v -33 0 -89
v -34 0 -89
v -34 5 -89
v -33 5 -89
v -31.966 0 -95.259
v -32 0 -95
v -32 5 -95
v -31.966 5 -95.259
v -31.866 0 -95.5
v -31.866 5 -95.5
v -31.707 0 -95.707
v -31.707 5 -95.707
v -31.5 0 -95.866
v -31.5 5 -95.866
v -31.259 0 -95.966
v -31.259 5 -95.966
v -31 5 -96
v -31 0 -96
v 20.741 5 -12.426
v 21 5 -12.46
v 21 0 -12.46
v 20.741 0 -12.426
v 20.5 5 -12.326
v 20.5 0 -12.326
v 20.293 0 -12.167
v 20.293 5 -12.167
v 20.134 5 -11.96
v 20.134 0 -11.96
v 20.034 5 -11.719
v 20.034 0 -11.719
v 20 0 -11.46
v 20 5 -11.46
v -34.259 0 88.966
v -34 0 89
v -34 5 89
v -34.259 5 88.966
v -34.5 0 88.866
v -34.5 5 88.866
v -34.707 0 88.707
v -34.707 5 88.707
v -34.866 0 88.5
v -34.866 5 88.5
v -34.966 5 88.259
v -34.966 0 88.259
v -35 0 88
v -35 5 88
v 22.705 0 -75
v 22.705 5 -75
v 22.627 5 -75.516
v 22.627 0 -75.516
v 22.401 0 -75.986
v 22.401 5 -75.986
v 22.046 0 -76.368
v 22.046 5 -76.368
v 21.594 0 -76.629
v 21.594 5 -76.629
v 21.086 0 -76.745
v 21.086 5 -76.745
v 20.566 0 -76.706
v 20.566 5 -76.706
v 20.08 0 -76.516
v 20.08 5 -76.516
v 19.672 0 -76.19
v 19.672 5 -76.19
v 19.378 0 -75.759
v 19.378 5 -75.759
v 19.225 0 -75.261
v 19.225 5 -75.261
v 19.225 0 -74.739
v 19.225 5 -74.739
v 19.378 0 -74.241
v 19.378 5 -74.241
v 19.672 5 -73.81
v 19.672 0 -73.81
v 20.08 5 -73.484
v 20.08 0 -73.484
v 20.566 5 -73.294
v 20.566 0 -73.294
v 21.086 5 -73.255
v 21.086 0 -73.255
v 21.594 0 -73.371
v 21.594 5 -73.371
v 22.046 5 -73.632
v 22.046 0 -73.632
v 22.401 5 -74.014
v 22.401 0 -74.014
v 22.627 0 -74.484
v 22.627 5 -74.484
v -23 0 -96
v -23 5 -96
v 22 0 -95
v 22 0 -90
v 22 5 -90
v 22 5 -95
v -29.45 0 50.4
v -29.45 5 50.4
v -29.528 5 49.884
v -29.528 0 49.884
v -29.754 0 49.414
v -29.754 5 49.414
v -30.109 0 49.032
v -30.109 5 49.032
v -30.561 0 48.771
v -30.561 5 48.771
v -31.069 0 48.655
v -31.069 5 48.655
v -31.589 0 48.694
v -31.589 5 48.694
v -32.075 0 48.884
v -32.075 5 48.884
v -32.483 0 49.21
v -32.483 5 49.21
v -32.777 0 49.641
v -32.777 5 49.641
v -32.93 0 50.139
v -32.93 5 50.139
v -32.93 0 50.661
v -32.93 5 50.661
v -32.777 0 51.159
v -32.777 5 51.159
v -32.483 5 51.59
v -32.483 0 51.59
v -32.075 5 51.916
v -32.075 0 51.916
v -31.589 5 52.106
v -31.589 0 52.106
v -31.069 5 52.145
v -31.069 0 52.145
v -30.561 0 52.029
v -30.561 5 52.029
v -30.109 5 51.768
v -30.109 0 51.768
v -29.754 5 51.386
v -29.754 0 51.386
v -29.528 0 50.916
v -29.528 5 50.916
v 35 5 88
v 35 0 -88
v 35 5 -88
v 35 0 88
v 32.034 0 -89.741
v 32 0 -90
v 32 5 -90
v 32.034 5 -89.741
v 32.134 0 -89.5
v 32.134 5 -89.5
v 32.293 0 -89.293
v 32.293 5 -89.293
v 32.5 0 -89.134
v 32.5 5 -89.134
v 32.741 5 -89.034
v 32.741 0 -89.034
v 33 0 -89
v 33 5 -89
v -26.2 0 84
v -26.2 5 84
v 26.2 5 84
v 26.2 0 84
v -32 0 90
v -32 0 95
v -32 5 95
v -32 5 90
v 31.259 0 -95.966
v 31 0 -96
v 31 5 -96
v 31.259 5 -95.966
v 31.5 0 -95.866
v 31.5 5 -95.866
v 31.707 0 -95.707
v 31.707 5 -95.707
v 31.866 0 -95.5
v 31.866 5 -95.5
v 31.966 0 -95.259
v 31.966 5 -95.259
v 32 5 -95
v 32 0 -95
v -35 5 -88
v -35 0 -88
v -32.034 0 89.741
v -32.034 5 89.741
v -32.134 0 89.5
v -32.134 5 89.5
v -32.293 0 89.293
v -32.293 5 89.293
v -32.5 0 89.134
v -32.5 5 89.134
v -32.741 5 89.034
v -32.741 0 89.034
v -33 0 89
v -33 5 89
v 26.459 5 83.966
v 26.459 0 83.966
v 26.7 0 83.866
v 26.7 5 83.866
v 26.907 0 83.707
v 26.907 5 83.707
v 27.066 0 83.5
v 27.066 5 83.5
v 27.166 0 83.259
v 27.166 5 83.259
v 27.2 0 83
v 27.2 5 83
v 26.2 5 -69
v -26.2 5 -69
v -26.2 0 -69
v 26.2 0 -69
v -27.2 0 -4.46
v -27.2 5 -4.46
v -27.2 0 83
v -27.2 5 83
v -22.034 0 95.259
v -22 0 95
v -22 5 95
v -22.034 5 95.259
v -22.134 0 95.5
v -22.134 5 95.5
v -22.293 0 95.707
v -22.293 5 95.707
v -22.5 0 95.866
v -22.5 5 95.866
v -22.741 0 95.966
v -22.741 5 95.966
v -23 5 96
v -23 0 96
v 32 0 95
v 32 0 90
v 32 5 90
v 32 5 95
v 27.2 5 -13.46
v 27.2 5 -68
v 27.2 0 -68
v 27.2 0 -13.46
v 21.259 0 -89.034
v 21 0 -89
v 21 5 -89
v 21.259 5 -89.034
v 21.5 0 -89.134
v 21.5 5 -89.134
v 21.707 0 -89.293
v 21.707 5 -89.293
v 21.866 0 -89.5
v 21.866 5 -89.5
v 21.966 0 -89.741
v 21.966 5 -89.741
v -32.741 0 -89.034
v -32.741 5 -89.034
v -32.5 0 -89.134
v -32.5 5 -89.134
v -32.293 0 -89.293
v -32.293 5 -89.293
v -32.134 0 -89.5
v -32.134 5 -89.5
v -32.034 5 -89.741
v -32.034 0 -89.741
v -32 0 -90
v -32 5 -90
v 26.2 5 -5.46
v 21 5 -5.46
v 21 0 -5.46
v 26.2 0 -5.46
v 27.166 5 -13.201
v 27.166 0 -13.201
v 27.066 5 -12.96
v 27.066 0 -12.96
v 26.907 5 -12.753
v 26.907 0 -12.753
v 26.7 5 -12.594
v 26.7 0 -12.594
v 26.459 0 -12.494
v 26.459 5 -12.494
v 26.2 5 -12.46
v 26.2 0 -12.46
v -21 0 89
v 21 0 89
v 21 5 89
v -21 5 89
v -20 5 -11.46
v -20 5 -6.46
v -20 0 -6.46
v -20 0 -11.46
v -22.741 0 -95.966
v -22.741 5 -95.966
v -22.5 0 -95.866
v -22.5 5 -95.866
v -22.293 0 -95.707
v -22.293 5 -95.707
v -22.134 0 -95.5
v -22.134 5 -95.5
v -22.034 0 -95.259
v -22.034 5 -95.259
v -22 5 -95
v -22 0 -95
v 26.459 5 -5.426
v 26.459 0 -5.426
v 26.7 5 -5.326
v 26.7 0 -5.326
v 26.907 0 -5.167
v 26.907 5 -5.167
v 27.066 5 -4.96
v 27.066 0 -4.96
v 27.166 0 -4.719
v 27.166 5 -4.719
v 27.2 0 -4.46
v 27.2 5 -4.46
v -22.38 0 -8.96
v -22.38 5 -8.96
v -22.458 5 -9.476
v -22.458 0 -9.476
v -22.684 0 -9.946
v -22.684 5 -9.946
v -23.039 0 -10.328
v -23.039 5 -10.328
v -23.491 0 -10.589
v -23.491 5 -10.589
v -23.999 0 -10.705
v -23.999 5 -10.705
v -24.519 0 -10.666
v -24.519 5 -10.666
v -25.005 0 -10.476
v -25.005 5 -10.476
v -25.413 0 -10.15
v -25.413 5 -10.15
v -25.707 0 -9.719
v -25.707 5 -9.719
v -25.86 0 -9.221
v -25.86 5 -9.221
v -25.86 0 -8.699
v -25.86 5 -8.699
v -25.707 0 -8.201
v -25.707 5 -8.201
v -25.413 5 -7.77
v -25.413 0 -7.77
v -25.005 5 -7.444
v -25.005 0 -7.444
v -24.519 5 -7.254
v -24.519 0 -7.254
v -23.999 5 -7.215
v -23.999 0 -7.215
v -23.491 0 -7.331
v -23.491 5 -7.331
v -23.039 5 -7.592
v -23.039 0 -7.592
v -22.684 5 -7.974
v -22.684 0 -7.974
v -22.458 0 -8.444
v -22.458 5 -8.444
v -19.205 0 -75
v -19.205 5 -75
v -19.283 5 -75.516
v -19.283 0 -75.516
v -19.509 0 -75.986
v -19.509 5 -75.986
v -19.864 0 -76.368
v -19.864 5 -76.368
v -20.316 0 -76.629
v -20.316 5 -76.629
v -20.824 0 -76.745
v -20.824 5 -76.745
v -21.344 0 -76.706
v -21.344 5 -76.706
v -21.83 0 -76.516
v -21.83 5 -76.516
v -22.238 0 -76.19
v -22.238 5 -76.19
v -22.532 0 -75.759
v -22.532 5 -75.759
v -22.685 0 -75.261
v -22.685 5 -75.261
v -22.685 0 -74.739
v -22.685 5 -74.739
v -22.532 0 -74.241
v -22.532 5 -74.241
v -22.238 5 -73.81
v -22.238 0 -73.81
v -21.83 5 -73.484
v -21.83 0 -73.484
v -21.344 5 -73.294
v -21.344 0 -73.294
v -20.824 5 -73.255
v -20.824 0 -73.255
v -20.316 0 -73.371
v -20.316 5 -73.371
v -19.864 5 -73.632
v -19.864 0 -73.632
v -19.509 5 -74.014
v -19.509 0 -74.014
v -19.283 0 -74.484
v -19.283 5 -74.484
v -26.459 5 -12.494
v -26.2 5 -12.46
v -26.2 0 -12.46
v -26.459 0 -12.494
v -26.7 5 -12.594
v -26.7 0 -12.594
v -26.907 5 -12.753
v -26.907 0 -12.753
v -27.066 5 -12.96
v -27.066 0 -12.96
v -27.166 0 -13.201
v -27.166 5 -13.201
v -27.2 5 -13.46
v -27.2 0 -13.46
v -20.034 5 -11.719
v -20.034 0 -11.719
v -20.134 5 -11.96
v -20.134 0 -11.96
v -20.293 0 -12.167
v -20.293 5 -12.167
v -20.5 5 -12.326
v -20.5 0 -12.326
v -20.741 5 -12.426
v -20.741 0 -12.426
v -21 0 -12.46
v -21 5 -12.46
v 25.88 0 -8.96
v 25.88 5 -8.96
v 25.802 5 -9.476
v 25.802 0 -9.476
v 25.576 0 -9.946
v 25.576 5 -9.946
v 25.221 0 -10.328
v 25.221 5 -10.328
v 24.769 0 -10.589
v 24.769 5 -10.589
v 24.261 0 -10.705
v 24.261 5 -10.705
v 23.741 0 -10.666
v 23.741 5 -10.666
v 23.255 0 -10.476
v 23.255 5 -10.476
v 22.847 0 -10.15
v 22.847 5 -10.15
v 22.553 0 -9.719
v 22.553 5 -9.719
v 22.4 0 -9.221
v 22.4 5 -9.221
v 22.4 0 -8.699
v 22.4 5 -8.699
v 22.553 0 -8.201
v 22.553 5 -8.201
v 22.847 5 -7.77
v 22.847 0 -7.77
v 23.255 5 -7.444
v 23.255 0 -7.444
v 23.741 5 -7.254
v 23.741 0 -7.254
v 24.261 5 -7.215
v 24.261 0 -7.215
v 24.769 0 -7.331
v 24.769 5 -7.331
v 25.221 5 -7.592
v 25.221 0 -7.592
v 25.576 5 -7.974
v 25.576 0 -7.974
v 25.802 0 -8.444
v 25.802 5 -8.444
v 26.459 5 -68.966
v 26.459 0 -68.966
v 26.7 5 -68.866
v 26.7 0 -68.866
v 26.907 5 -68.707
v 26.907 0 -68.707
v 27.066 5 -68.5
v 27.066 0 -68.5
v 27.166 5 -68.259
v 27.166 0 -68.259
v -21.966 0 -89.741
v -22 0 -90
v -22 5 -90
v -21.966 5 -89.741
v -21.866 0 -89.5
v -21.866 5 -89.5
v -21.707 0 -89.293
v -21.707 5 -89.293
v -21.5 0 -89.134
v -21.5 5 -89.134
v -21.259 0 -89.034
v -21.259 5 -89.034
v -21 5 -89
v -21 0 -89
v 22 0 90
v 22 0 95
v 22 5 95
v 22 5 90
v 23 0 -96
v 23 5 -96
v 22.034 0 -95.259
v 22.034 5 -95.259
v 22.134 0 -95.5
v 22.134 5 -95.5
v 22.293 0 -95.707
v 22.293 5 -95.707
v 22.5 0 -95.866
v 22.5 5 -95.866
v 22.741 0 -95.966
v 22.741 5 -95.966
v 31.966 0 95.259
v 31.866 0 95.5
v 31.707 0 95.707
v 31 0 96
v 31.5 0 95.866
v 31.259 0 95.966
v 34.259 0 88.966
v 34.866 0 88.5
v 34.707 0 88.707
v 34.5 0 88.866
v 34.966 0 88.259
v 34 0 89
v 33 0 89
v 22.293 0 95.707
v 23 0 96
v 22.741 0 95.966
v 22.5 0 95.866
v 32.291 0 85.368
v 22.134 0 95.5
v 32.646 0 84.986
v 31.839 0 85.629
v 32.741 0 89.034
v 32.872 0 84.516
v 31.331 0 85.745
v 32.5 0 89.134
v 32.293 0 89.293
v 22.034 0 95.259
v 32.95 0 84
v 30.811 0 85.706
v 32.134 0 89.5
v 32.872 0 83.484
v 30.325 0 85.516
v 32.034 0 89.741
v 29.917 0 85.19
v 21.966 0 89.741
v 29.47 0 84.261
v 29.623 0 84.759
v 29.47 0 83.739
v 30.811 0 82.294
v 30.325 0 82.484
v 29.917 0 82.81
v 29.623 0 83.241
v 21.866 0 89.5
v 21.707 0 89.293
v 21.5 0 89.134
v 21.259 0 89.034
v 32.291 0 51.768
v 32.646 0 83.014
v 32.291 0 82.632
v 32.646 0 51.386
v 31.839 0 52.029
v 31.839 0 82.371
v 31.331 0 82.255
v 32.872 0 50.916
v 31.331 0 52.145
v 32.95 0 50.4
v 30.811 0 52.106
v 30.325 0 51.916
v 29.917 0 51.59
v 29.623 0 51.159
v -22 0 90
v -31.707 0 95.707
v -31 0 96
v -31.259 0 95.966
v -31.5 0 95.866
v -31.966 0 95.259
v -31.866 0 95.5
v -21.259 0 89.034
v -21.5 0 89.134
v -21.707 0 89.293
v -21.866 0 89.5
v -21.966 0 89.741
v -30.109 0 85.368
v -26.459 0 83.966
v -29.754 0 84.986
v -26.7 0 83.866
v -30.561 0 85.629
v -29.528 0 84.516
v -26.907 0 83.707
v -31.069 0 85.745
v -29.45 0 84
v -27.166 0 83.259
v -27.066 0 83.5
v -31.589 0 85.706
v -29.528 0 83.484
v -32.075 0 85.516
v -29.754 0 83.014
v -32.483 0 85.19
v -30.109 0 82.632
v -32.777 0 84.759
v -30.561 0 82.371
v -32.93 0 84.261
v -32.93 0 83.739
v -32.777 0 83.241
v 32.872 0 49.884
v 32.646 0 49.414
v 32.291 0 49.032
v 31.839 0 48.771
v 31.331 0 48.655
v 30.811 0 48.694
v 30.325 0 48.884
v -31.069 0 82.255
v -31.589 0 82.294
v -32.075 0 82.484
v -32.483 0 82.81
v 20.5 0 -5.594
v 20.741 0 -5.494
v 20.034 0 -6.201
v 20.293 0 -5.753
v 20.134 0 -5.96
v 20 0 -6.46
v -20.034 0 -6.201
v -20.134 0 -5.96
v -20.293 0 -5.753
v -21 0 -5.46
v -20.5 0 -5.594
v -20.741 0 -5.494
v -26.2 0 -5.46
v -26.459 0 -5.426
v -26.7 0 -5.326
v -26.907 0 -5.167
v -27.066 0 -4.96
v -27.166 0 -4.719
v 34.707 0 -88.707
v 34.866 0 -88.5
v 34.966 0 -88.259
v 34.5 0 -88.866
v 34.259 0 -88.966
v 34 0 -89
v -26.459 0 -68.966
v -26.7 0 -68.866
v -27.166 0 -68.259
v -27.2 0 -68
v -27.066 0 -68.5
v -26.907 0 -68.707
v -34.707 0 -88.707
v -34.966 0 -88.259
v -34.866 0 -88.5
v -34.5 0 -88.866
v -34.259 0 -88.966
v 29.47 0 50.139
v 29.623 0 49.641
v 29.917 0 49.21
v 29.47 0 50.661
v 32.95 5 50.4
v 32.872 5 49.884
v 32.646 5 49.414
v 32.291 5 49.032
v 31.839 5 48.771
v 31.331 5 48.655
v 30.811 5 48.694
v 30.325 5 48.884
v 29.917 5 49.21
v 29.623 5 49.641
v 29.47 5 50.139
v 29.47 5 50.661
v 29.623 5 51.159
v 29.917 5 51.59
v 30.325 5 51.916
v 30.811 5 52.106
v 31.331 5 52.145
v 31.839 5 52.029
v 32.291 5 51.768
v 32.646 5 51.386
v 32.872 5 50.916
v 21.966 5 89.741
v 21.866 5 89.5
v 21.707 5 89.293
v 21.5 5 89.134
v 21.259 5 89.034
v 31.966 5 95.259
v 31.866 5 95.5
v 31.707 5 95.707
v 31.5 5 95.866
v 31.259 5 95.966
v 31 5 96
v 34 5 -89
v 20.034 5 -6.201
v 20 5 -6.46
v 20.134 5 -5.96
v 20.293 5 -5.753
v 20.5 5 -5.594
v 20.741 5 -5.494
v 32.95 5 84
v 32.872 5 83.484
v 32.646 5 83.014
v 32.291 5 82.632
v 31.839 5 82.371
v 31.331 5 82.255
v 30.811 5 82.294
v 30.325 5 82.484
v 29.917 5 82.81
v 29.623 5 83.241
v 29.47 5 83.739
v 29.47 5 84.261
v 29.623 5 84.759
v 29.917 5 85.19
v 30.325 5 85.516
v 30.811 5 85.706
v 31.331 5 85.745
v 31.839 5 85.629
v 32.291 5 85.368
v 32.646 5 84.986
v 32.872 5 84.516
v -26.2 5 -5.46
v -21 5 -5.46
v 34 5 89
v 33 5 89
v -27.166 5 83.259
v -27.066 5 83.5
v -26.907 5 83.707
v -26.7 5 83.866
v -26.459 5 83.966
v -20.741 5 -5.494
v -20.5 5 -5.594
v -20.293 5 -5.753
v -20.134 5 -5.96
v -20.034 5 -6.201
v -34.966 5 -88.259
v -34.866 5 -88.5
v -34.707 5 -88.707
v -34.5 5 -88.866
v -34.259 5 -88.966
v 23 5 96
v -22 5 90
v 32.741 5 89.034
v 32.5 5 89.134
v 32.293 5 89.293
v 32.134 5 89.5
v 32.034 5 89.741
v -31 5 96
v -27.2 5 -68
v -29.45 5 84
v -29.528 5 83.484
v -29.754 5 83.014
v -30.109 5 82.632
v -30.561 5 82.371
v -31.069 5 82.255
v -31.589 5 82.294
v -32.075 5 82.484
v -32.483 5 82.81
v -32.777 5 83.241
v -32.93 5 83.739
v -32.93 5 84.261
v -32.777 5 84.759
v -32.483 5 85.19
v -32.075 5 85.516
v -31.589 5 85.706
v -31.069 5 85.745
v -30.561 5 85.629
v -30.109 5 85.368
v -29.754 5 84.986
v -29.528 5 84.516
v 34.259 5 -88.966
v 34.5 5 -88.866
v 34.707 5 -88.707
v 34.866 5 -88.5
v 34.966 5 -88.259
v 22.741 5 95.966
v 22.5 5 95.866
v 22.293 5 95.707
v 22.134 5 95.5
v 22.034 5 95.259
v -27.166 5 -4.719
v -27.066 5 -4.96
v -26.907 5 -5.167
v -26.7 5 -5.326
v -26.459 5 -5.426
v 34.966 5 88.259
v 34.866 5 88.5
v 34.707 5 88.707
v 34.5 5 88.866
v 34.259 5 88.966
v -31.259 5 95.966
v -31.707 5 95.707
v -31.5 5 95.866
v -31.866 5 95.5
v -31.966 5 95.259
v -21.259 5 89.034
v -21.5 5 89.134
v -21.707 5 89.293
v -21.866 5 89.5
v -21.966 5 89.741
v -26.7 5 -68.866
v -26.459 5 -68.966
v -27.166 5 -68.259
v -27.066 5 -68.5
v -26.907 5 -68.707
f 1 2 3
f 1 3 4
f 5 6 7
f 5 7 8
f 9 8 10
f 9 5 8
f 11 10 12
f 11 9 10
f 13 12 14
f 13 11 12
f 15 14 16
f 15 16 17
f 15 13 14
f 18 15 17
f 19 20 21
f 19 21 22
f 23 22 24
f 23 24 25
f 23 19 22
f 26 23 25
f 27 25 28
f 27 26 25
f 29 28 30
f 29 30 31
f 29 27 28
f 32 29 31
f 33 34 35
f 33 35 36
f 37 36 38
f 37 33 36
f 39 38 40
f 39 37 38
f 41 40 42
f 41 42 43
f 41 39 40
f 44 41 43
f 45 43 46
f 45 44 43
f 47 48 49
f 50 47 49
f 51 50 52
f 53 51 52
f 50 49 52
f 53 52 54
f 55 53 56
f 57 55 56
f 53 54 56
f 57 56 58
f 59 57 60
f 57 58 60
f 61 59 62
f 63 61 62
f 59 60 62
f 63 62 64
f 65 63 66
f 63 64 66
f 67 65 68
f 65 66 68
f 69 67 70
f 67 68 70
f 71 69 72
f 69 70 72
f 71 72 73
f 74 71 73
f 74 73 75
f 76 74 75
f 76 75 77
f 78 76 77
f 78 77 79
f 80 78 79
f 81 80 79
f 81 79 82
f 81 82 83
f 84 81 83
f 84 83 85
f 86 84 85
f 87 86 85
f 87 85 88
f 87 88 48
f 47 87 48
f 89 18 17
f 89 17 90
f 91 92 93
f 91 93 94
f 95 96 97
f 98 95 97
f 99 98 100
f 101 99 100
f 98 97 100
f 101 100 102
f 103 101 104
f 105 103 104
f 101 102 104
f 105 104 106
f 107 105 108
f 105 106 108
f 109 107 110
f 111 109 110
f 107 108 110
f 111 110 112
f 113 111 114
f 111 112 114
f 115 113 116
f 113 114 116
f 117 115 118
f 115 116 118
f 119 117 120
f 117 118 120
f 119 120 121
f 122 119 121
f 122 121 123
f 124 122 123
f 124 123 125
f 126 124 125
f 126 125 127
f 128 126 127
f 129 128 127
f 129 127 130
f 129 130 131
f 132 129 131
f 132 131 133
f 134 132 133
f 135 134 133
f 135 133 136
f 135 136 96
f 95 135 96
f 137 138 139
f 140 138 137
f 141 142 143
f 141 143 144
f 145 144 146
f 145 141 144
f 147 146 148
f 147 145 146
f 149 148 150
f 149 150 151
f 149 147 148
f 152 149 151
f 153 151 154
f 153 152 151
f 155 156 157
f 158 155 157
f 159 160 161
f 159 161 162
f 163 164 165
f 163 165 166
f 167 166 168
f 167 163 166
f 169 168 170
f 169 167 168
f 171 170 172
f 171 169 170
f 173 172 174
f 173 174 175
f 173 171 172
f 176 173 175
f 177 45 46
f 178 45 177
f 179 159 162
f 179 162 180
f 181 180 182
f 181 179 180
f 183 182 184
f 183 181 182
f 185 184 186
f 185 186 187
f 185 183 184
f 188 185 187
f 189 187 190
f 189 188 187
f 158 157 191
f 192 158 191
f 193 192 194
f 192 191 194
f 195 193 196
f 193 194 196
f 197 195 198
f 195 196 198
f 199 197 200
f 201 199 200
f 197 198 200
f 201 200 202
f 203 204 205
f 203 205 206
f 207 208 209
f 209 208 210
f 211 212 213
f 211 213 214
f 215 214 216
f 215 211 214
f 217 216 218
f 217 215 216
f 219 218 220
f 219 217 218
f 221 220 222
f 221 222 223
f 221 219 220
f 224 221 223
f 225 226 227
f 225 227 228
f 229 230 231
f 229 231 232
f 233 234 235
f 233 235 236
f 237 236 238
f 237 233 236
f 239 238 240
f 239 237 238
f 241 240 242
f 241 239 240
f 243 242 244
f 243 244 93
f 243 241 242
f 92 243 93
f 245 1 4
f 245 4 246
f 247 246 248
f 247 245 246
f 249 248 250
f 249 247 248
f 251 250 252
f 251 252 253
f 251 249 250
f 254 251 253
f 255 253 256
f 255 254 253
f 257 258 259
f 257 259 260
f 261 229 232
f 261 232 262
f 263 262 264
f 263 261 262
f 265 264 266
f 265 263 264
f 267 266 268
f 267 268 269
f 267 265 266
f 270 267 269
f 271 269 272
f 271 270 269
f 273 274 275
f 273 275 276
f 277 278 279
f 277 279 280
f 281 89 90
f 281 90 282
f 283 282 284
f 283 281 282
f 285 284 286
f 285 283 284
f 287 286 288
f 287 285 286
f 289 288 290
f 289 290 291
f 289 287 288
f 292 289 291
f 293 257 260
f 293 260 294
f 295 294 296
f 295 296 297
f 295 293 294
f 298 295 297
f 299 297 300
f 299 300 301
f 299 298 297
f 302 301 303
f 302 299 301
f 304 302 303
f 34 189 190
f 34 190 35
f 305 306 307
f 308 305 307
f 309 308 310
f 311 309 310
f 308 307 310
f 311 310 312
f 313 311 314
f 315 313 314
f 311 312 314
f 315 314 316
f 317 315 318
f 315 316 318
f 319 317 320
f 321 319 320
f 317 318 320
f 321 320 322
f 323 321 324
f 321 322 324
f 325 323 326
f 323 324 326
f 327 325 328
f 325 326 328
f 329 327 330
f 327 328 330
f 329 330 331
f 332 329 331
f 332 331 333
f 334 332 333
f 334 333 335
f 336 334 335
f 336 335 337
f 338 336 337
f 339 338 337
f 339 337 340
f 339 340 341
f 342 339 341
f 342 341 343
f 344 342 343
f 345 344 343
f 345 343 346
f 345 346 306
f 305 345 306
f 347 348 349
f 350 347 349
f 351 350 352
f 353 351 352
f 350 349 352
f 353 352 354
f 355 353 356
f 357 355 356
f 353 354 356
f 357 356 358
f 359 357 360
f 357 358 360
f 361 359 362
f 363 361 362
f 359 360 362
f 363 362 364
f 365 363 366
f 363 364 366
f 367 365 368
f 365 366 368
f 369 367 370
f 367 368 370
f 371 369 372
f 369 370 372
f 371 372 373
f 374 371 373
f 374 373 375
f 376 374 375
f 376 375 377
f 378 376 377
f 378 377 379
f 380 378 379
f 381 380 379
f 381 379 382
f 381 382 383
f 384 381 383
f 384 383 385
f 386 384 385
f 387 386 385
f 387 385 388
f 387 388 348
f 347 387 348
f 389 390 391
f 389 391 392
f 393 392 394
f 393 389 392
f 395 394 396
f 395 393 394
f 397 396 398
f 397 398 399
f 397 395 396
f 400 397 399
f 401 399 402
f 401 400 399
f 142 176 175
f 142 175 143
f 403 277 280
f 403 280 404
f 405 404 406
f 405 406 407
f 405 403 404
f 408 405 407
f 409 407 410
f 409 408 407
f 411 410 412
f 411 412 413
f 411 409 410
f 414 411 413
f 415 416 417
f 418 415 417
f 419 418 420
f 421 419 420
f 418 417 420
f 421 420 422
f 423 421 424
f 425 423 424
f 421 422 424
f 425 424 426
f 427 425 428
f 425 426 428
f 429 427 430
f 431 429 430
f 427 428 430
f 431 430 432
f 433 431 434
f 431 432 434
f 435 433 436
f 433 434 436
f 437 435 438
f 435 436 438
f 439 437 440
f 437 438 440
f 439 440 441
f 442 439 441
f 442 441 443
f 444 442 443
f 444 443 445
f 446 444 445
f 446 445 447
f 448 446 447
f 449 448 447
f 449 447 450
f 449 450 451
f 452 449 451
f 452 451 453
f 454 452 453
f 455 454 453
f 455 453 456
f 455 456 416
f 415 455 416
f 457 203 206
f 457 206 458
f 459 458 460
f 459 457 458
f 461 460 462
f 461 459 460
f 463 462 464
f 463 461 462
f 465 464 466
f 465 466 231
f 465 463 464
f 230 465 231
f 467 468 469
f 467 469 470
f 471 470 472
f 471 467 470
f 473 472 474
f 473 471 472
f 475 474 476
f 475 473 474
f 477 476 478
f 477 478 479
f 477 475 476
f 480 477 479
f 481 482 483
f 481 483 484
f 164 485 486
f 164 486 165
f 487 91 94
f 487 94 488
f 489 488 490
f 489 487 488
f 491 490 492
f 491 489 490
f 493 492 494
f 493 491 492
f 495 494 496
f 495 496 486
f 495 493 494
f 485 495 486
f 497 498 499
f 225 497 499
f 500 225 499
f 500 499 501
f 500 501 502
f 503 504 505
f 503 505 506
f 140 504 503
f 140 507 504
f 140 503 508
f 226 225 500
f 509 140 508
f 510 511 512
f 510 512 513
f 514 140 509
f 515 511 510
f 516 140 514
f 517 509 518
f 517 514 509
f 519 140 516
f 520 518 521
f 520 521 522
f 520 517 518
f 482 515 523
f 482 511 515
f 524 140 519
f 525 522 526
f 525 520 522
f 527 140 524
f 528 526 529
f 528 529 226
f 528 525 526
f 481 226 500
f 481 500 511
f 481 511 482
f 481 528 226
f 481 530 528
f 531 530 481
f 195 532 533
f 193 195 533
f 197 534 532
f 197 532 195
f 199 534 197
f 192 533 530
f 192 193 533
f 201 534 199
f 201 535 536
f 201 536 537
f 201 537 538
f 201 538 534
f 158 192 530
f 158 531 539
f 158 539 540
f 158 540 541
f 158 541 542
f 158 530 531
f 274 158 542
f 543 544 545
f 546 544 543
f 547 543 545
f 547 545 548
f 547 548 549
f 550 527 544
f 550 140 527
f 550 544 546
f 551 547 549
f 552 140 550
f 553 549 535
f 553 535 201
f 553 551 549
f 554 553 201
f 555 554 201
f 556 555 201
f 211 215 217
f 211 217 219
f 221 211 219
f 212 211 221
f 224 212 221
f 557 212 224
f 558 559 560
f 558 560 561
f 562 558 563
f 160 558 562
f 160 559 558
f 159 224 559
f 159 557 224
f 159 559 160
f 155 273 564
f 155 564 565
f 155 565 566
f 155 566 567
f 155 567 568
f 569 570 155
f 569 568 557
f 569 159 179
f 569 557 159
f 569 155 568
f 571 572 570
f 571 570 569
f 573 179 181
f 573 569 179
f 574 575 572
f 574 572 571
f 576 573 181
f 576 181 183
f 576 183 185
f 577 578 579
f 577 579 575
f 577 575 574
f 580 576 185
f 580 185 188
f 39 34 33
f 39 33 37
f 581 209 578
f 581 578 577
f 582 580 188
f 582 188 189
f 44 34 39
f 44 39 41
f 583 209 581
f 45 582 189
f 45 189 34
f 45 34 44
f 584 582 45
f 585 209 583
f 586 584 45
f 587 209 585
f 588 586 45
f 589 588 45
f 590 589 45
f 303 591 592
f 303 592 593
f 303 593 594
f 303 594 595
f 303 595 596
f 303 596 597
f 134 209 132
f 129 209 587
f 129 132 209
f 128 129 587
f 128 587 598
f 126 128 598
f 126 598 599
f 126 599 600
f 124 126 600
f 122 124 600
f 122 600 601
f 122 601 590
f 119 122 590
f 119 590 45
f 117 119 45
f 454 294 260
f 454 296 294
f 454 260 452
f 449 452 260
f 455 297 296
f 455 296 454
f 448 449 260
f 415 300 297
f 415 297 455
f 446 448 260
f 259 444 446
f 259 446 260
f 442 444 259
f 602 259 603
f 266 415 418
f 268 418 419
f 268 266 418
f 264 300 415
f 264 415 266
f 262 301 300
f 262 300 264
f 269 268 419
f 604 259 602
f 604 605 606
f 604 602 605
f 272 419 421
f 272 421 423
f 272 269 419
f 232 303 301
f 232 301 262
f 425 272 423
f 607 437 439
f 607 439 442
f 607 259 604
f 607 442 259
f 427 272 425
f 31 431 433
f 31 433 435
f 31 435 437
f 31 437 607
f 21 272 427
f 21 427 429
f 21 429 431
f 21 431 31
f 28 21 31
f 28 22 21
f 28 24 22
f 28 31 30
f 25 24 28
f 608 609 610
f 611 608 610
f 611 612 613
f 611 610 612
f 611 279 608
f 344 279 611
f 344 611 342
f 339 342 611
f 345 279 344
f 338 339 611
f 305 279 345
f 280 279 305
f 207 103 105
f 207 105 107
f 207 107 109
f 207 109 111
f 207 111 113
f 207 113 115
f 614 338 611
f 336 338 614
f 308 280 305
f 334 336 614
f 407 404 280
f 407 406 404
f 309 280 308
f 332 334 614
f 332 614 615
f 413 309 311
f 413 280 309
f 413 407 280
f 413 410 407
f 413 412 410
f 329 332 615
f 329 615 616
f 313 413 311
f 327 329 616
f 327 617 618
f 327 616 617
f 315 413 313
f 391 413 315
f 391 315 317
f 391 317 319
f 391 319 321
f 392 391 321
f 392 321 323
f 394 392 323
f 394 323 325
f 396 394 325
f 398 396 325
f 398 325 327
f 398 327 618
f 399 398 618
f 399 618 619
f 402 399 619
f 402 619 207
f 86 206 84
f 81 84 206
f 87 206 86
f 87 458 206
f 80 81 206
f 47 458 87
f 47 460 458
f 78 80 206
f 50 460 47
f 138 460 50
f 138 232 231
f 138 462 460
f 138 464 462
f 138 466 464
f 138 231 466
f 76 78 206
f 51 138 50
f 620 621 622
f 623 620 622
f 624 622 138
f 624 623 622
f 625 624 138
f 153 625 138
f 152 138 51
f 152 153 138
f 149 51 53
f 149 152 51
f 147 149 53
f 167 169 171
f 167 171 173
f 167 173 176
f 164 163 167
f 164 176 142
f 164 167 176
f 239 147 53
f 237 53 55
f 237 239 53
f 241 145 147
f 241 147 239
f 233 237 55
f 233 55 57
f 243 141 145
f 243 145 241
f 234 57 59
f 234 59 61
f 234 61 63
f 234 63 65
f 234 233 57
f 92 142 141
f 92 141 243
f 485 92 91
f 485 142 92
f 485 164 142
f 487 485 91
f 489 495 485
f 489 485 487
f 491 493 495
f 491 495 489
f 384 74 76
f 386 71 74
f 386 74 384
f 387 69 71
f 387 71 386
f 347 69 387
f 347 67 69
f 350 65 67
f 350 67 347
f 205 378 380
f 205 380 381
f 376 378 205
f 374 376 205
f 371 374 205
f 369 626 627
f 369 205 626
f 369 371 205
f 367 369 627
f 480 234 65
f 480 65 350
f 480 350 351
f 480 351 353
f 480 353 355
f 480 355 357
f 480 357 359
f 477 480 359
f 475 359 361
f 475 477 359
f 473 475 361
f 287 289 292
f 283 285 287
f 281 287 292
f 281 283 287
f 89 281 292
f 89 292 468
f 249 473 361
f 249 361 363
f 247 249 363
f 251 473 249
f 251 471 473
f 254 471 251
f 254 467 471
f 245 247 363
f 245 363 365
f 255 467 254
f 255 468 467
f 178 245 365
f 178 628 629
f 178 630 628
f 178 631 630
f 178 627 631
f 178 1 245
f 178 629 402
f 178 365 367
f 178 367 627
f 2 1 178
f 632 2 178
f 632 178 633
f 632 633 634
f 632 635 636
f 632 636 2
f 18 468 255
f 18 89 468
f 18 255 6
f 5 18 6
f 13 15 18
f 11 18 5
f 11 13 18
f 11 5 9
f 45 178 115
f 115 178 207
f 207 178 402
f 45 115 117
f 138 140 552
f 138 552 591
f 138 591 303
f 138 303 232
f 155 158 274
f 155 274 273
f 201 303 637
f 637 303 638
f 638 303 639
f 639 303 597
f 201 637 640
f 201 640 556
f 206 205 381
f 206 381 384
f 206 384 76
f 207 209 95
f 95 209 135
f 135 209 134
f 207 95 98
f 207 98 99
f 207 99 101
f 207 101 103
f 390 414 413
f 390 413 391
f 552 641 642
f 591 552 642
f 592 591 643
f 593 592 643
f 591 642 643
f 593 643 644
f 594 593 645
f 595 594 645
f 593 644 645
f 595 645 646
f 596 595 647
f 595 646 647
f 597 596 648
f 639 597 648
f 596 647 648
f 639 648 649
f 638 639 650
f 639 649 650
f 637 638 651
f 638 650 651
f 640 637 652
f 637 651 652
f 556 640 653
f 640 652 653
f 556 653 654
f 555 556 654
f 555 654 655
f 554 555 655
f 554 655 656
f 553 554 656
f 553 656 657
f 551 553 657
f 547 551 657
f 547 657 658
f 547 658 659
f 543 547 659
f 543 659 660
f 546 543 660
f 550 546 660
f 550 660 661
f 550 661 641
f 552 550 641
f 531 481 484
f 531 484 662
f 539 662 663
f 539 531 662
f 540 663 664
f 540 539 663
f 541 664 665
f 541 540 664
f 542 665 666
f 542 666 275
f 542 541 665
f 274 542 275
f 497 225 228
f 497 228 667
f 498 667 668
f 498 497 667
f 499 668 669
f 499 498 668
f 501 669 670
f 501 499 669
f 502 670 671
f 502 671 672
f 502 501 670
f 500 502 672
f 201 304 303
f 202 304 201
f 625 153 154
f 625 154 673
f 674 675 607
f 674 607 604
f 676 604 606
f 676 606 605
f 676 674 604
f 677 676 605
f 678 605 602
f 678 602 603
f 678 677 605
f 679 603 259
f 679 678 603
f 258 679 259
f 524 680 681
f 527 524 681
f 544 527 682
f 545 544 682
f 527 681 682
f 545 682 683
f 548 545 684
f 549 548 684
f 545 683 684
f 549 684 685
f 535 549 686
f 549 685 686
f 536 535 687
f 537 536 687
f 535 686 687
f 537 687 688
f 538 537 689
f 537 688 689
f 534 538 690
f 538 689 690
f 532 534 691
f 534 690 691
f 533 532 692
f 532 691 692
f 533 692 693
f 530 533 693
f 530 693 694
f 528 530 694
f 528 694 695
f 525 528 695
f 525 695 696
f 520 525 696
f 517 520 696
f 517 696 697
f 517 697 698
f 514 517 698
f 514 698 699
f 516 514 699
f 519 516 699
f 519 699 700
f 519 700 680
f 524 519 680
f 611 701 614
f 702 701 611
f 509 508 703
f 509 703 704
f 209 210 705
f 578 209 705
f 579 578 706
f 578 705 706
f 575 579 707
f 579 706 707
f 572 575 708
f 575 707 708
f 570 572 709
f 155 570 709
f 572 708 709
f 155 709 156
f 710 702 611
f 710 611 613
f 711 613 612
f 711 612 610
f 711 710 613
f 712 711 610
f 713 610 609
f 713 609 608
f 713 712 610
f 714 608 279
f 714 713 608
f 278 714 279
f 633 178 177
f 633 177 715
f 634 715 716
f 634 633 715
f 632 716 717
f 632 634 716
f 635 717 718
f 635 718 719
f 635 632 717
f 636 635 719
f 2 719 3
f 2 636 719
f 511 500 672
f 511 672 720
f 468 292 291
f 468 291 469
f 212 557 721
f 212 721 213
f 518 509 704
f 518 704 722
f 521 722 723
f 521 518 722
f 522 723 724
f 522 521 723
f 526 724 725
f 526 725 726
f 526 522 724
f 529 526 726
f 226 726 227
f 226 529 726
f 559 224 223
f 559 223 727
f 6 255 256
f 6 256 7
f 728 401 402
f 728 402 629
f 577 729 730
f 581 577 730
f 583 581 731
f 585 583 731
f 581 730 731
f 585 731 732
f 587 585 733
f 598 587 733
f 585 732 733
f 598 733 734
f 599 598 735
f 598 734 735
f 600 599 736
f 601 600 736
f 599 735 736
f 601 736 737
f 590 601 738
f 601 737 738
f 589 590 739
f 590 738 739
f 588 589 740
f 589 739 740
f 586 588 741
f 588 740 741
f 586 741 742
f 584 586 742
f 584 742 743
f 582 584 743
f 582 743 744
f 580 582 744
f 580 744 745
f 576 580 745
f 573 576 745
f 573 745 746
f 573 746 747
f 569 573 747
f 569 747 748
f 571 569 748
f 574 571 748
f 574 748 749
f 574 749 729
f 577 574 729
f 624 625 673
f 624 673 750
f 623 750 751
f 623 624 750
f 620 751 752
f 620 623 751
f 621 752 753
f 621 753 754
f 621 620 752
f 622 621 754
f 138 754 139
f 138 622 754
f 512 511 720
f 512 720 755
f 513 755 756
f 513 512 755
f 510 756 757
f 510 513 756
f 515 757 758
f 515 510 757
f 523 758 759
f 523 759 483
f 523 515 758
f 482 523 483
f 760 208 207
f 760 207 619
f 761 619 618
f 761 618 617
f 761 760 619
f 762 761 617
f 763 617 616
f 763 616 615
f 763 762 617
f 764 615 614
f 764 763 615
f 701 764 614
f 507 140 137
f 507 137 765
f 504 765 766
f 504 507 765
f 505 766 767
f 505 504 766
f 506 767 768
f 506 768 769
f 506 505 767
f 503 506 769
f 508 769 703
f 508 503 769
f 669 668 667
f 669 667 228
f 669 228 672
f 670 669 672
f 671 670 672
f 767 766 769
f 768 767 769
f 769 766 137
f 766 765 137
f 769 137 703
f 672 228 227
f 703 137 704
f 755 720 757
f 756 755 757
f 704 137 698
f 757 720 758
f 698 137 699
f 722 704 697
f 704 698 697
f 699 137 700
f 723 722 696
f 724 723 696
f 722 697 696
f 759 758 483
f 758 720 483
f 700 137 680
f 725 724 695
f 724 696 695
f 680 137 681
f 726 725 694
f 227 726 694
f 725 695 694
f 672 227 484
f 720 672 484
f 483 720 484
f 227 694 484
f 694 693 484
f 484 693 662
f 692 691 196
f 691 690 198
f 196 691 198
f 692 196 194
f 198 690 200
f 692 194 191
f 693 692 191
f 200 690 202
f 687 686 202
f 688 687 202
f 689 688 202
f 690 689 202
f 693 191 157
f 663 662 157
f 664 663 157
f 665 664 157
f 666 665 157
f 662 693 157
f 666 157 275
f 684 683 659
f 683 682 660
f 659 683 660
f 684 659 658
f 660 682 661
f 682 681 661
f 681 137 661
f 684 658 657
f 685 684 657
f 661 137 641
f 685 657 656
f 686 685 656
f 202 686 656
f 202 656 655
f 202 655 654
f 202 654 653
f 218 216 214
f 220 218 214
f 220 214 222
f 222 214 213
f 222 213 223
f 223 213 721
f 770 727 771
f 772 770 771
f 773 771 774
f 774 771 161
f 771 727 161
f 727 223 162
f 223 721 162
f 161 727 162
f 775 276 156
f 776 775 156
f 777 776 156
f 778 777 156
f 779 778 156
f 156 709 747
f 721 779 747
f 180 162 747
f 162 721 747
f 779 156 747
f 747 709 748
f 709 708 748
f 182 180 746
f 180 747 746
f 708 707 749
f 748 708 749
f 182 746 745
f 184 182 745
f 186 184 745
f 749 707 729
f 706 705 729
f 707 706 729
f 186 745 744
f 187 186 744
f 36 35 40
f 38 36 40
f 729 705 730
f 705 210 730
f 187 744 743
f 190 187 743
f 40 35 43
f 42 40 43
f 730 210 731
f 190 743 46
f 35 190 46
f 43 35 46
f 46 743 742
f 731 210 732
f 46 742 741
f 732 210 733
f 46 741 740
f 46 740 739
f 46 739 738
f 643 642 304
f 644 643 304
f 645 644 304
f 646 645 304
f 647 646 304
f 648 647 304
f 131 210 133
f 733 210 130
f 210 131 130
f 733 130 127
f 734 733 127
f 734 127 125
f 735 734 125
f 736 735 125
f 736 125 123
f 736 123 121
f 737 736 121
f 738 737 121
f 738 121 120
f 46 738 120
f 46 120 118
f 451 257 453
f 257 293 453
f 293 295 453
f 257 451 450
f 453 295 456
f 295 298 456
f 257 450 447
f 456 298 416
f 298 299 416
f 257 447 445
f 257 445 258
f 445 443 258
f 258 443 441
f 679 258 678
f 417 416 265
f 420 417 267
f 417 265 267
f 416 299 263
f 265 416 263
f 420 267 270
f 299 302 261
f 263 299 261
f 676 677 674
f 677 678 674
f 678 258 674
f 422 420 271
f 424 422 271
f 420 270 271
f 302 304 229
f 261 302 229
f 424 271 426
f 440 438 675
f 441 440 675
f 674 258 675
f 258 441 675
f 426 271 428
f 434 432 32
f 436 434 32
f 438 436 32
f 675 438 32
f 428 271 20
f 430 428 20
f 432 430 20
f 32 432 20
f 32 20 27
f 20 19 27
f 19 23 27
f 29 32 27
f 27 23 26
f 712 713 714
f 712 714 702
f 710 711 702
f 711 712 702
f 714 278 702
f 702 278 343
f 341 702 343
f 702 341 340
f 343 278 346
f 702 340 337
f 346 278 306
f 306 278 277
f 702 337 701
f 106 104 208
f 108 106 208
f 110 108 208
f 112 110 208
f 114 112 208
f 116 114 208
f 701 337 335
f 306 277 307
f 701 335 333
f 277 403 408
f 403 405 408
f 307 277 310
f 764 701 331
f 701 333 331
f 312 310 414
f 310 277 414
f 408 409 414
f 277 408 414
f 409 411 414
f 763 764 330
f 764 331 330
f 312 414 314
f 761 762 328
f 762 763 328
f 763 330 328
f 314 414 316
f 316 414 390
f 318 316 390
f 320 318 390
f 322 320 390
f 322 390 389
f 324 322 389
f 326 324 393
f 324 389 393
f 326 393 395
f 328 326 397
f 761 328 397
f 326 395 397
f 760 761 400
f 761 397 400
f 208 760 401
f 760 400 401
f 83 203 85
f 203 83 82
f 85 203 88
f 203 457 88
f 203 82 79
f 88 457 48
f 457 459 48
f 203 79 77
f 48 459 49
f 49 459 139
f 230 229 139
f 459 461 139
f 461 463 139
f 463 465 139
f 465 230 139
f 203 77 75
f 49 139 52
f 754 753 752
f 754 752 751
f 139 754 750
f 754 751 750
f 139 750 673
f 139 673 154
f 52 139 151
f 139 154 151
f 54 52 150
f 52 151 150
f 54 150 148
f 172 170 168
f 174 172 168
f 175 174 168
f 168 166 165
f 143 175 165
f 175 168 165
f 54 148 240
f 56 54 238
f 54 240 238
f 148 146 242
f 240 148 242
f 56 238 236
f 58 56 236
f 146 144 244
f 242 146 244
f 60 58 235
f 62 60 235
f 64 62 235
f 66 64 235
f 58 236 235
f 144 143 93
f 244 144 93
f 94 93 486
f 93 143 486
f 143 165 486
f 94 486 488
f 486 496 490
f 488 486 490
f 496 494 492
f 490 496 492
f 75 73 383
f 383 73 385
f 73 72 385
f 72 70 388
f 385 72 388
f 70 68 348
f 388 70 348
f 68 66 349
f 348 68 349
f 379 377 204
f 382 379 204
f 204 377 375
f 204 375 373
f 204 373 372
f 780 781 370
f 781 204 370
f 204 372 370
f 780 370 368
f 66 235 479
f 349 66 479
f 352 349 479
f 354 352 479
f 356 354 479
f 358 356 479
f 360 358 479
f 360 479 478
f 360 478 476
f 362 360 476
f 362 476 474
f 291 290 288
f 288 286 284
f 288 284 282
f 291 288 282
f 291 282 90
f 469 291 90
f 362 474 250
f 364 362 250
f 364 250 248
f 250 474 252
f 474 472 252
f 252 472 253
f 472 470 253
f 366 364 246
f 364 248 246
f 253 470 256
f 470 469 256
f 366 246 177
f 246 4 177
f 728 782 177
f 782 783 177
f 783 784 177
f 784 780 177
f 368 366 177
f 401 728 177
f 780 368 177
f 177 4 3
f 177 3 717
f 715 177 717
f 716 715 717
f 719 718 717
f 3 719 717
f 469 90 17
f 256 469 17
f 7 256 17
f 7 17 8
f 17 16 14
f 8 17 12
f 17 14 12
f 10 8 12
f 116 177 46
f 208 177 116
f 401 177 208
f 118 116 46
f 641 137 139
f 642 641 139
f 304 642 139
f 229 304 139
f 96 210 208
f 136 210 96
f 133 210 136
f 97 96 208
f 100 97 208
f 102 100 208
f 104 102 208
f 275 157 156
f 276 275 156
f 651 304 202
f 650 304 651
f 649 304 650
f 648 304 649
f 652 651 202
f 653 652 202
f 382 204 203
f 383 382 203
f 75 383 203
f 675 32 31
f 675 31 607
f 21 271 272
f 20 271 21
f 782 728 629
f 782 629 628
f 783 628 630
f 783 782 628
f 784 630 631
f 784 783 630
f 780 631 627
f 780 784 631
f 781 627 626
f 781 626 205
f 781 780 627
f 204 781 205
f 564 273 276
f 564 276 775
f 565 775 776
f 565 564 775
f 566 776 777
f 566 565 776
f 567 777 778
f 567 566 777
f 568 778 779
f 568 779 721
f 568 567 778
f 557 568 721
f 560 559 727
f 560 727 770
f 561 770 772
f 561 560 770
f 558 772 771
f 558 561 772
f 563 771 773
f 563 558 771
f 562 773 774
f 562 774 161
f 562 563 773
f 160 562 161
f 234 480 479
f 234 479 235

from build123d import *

# Parameters (mm, degrees)
BOSS_EXTRUDE1_DEPTH = 5
SKETCH2_R           = 1.75
CUT_EXTRUDE1_DEPTH  = 10
SKETCH3_R           = 1.75
CUT_EXTRUDE2_DEPTH  = 10
CUT_EXTRUDE3_DEPTH  = 65
SKETCH5_W           = 54.4
SKETCH5_H           = 38
CUT_EXTRUDE4_DEPTH  = 5
CUT_EXTRUDE5_DEPTH  = 5


with BuildPart() as part:
    # Sketch1 → Boss-Extrude1 (new body)
    with BuildSketch(Plane(origin=(0, 0, 0), x_dir=(1, 0, 0), z_dir=(0, 1, 0))):
        with BuildLine():
            Line((34, -89), (33, -89))
            ThreePointArc((33, -89), (32.292893219, -89.292893219), (32, -90))
            Line((32, -90), (32, -95))
            ThreePointArc((32, -95), (31.707106781, -95.707106781), (31, -96))
            Line((31, -96), (23, -96))
            ThreePointArc((23, -96), (22.292893219, -95.707106781), (22, -95))
            Line((22, -95), (22, -90))
            ThreePointArc((22, -90), (21.707106781, -89.292893219), (21, -89))
            Line((21, -89), (-21, -89))
            ThreePointArc((-21, -89), (-21.707106781, -89.292893219), (-22, -90))
            Line((-22, -90), (-22, -95))
            ThreePointArc((-22, -95), (-22.292893219, -95.707106781), (-23, -96))
            Line((-23, -96), (-31, -96))
            ThreePointArc((-31, -96), (-31.707106781, -95.707106781), (-32, -95))
            Line((-32, -95), (-32, -90))
            ThreePointArc((-32, -90), (-32.292893219, -89.292893219), (-33, -89))
            Line((-33, -89), (-34, -89))
            ThreePointArc((-34, -89), (-34.707106781, -88.707106781), (-35, -88))
            Line((-35, -88), (-35, 88))
            ThreePointArc((-35, 88), (-34.707106781, 88.707106781), (-34, 89))
            Line((-34, 89), (-33, 89))
            ThreePointArc((-33, 89), (-32.292893219, 89.292893219), (-32, 90))
            Line((-32, 90), (-32, 95))
            ThreePointArc((-32, 95), (-31.707106781, 95.707106781), (-31, 96))
            Line((-31, 96), (-23, 96))
            ThreePointArc((-23, 96), (-22.292893219, 95.707106781), (-22, 95))
            Line((-22, 95), (-22, 90))
            ThreePointArc((-22, 90), (-21.707106781, 89.292893219), (-21, 89))
            Line((-21, 89), (21, 89))
            ThreePointArc((21, 89), (21.707106781, 89.292893219), (22, 90))
            Line((22, 90), (22, 95))
            ThreePointArc((22, 95), (22.292893219, 95.707106781), (23, 96))
            Line((23, 96), (31, 96))
            ThreePointArc((31, 96), (31.707106781, 95.707106781), (32, 95))
            Line((32, 95), (32, 90))
            ThreePointArc((32, 90), (32.292893219, 89.292893219), (33, 89))
            Line((33, 89), (34, 89))
            ThreePointArc((34, 89), (34.707106781, 88.707106781), (35, 88))
            Line((35, 88), (35, -88))
            ThreePointArc((35, -88), (34.707106781, -88.707106781), (34, -89))
        make_face()
    extrude(amount=BOSS_EXTRUDE1_DEPTH)

    # Sketch2 → Cut-Extrude1 (cut)
    with BuildSketch(Plane(origin=(0, 5, 0), x_dir=(1, 0, 0), z_dir=(0, 1, 0))):
        with Locations((-20.955, 75)):
            Circle(SKETCH2_R)
        with Locations((-24.13, 8.96)):
            Circle(SKETCH2_R)
        with Locations((20.955, 75)):
            Circle(SKETCH2_R)
        with Locations((24.13, 8.96)):
            Circle(SKETCH2_R)
    extrude(amount=-CUT_EXTRUDE1_DEPTH, mode=Mode.SUBTRACT)

    # Sketch3 → Cut-Extrude2 (cut)
    with BuildSketch(Plane(origin=(0, 5, 0), x_dir=(1, 0, 0), z_dir=(0, 1, 0))):
        with Locations((-31.2, -84)):
            Circle(SKETCH3_R)
        with Locations((31.2, -84)):
            Circle(SKETCH3_R)
        with Locations((31.2, -50.4)):
            Circle(SKETCH3_R)
        with Locations((-31.2, -50.4)):
            Circle(SKETCH3_R)
    extrude(amount=-CUT_EXTRUDE2_DEPTH, mode=Mode.SUBTRACT)

    # Sketch4 → Cut-Extrude3 (cut)
    with BuildSketch(Plane(origin=(0, 5, 0), x_dir=(1, 0, 0), z_dir=(0, 1, 0))):
        with BuildLine():
            Line((-26.2, -84), (26.2, -84))
            ThreePointArc((26.2, -84), (26.907106781, -83.707106781), (27.2, -83))
            Line((27.2, -83), (27.2, -50.4))
            Line((27.2, -50.4), (-27.2, -50.4))
            Line((-27.2, -50.4), (-27.2, -72.4))
            Line((-27.2, -72.4), (-27.2, -83))
            ThreePointArc((-27.2, -83), (-26.907106781, -83.707106781), (-26.2, -84))
        make_face()
    extrude(amount=-CUT_EXTRUDE3_DEPTH, mode=Mode.SUBTRACT)

    # Sketch5 → Cut-Extrude4 (cut)
    with BuildSketch(Plane(origin=(0, 5, 0), x_dir=(1, 0, 0), z_dir=(0, 1, 0))):
        with Locations((0, -31.4)):
            Rectangle(SKETCH5_W, SKETCH5_H)
    extrude(amount=-CUT_EXTRUDE4_DEPTH, mode=Mode.SUBTRACT)

    # Sketch6 → Cut-Extrude5 (cut)
    with BuildSketch(Plane(origin=(0, 5, 0), x_dir=(1, 0, 0), z_dir=(0, 1, 0))):
        with BuildLine():
            Line((26.2, 12.46), (21, 12.46))
            ThreePointArc((21, 12.46), (20.292893219, 12.167106781), (20, 11.46))
            Line((20, 11.46), (20, 6.46))
            ThreePointArc((20, 6.46), (20.292893219, 5.752893219), (21, 5.46))
            Line((21, 5.46), (26.2, 5.46))
            ThreePointArc((26.2, 5.46), (26.907106781, 5.167106781), (27.2, 4.46))
            Line((27.2, 4.46), (27.2, -12.54))
            Line((27.2, -12.54), (16, -12.54))
            Line((16, -12.54), (-20, -12.54))
            Line((-20, -12.54), (-27.2, -12.54))
            Line((-27.2, -12.54), (-27.2, 4.46))
            ThreePointArc((-27.2, 4.46), (-26.907106781, 5.167106781), (-26.2, 5.46))
            Line((-26.2, 5.46), (-21, 5.46))
            ThreePointArc((-21, 5.46), (-20.292893219, 5.752893219), (-20, 6.46))
            Line((-20, 6.46), (-20, 11.46))
            ThreePointArc((-20, 11.46), (-20.292893219, 12.167106781), (-21, 12.46))
            Line((-21, 12.46), (-26.2, 12.46))
            ThreePointArc((-26.2, 12.46), (-26.907106781, 12.752893219), (-27.2, 13.46))
            Line((-27.2, 13.46), (-27.2, 68))
            ThreePointArc((-27.2, 68), (-26.907106781, 68.707106781), (-26.2, 69))
            Line((-26.2, 69), (26.2, 69))
            ThreePointArc((26.2, 69), (26.907106781, 68.707106781), (27.2, 68))
            Line((27.2, 68), (27.2, 13.46))
            ThreePointArc((27.2, 13.46), (26.907106781, 12.752893219), (26.2, 12.46))
        make_face()
    extrude(amount=-CUT_EXTRUDE5_DEPTH, mode=Mode.SUBTRACT)


solid = part.part
